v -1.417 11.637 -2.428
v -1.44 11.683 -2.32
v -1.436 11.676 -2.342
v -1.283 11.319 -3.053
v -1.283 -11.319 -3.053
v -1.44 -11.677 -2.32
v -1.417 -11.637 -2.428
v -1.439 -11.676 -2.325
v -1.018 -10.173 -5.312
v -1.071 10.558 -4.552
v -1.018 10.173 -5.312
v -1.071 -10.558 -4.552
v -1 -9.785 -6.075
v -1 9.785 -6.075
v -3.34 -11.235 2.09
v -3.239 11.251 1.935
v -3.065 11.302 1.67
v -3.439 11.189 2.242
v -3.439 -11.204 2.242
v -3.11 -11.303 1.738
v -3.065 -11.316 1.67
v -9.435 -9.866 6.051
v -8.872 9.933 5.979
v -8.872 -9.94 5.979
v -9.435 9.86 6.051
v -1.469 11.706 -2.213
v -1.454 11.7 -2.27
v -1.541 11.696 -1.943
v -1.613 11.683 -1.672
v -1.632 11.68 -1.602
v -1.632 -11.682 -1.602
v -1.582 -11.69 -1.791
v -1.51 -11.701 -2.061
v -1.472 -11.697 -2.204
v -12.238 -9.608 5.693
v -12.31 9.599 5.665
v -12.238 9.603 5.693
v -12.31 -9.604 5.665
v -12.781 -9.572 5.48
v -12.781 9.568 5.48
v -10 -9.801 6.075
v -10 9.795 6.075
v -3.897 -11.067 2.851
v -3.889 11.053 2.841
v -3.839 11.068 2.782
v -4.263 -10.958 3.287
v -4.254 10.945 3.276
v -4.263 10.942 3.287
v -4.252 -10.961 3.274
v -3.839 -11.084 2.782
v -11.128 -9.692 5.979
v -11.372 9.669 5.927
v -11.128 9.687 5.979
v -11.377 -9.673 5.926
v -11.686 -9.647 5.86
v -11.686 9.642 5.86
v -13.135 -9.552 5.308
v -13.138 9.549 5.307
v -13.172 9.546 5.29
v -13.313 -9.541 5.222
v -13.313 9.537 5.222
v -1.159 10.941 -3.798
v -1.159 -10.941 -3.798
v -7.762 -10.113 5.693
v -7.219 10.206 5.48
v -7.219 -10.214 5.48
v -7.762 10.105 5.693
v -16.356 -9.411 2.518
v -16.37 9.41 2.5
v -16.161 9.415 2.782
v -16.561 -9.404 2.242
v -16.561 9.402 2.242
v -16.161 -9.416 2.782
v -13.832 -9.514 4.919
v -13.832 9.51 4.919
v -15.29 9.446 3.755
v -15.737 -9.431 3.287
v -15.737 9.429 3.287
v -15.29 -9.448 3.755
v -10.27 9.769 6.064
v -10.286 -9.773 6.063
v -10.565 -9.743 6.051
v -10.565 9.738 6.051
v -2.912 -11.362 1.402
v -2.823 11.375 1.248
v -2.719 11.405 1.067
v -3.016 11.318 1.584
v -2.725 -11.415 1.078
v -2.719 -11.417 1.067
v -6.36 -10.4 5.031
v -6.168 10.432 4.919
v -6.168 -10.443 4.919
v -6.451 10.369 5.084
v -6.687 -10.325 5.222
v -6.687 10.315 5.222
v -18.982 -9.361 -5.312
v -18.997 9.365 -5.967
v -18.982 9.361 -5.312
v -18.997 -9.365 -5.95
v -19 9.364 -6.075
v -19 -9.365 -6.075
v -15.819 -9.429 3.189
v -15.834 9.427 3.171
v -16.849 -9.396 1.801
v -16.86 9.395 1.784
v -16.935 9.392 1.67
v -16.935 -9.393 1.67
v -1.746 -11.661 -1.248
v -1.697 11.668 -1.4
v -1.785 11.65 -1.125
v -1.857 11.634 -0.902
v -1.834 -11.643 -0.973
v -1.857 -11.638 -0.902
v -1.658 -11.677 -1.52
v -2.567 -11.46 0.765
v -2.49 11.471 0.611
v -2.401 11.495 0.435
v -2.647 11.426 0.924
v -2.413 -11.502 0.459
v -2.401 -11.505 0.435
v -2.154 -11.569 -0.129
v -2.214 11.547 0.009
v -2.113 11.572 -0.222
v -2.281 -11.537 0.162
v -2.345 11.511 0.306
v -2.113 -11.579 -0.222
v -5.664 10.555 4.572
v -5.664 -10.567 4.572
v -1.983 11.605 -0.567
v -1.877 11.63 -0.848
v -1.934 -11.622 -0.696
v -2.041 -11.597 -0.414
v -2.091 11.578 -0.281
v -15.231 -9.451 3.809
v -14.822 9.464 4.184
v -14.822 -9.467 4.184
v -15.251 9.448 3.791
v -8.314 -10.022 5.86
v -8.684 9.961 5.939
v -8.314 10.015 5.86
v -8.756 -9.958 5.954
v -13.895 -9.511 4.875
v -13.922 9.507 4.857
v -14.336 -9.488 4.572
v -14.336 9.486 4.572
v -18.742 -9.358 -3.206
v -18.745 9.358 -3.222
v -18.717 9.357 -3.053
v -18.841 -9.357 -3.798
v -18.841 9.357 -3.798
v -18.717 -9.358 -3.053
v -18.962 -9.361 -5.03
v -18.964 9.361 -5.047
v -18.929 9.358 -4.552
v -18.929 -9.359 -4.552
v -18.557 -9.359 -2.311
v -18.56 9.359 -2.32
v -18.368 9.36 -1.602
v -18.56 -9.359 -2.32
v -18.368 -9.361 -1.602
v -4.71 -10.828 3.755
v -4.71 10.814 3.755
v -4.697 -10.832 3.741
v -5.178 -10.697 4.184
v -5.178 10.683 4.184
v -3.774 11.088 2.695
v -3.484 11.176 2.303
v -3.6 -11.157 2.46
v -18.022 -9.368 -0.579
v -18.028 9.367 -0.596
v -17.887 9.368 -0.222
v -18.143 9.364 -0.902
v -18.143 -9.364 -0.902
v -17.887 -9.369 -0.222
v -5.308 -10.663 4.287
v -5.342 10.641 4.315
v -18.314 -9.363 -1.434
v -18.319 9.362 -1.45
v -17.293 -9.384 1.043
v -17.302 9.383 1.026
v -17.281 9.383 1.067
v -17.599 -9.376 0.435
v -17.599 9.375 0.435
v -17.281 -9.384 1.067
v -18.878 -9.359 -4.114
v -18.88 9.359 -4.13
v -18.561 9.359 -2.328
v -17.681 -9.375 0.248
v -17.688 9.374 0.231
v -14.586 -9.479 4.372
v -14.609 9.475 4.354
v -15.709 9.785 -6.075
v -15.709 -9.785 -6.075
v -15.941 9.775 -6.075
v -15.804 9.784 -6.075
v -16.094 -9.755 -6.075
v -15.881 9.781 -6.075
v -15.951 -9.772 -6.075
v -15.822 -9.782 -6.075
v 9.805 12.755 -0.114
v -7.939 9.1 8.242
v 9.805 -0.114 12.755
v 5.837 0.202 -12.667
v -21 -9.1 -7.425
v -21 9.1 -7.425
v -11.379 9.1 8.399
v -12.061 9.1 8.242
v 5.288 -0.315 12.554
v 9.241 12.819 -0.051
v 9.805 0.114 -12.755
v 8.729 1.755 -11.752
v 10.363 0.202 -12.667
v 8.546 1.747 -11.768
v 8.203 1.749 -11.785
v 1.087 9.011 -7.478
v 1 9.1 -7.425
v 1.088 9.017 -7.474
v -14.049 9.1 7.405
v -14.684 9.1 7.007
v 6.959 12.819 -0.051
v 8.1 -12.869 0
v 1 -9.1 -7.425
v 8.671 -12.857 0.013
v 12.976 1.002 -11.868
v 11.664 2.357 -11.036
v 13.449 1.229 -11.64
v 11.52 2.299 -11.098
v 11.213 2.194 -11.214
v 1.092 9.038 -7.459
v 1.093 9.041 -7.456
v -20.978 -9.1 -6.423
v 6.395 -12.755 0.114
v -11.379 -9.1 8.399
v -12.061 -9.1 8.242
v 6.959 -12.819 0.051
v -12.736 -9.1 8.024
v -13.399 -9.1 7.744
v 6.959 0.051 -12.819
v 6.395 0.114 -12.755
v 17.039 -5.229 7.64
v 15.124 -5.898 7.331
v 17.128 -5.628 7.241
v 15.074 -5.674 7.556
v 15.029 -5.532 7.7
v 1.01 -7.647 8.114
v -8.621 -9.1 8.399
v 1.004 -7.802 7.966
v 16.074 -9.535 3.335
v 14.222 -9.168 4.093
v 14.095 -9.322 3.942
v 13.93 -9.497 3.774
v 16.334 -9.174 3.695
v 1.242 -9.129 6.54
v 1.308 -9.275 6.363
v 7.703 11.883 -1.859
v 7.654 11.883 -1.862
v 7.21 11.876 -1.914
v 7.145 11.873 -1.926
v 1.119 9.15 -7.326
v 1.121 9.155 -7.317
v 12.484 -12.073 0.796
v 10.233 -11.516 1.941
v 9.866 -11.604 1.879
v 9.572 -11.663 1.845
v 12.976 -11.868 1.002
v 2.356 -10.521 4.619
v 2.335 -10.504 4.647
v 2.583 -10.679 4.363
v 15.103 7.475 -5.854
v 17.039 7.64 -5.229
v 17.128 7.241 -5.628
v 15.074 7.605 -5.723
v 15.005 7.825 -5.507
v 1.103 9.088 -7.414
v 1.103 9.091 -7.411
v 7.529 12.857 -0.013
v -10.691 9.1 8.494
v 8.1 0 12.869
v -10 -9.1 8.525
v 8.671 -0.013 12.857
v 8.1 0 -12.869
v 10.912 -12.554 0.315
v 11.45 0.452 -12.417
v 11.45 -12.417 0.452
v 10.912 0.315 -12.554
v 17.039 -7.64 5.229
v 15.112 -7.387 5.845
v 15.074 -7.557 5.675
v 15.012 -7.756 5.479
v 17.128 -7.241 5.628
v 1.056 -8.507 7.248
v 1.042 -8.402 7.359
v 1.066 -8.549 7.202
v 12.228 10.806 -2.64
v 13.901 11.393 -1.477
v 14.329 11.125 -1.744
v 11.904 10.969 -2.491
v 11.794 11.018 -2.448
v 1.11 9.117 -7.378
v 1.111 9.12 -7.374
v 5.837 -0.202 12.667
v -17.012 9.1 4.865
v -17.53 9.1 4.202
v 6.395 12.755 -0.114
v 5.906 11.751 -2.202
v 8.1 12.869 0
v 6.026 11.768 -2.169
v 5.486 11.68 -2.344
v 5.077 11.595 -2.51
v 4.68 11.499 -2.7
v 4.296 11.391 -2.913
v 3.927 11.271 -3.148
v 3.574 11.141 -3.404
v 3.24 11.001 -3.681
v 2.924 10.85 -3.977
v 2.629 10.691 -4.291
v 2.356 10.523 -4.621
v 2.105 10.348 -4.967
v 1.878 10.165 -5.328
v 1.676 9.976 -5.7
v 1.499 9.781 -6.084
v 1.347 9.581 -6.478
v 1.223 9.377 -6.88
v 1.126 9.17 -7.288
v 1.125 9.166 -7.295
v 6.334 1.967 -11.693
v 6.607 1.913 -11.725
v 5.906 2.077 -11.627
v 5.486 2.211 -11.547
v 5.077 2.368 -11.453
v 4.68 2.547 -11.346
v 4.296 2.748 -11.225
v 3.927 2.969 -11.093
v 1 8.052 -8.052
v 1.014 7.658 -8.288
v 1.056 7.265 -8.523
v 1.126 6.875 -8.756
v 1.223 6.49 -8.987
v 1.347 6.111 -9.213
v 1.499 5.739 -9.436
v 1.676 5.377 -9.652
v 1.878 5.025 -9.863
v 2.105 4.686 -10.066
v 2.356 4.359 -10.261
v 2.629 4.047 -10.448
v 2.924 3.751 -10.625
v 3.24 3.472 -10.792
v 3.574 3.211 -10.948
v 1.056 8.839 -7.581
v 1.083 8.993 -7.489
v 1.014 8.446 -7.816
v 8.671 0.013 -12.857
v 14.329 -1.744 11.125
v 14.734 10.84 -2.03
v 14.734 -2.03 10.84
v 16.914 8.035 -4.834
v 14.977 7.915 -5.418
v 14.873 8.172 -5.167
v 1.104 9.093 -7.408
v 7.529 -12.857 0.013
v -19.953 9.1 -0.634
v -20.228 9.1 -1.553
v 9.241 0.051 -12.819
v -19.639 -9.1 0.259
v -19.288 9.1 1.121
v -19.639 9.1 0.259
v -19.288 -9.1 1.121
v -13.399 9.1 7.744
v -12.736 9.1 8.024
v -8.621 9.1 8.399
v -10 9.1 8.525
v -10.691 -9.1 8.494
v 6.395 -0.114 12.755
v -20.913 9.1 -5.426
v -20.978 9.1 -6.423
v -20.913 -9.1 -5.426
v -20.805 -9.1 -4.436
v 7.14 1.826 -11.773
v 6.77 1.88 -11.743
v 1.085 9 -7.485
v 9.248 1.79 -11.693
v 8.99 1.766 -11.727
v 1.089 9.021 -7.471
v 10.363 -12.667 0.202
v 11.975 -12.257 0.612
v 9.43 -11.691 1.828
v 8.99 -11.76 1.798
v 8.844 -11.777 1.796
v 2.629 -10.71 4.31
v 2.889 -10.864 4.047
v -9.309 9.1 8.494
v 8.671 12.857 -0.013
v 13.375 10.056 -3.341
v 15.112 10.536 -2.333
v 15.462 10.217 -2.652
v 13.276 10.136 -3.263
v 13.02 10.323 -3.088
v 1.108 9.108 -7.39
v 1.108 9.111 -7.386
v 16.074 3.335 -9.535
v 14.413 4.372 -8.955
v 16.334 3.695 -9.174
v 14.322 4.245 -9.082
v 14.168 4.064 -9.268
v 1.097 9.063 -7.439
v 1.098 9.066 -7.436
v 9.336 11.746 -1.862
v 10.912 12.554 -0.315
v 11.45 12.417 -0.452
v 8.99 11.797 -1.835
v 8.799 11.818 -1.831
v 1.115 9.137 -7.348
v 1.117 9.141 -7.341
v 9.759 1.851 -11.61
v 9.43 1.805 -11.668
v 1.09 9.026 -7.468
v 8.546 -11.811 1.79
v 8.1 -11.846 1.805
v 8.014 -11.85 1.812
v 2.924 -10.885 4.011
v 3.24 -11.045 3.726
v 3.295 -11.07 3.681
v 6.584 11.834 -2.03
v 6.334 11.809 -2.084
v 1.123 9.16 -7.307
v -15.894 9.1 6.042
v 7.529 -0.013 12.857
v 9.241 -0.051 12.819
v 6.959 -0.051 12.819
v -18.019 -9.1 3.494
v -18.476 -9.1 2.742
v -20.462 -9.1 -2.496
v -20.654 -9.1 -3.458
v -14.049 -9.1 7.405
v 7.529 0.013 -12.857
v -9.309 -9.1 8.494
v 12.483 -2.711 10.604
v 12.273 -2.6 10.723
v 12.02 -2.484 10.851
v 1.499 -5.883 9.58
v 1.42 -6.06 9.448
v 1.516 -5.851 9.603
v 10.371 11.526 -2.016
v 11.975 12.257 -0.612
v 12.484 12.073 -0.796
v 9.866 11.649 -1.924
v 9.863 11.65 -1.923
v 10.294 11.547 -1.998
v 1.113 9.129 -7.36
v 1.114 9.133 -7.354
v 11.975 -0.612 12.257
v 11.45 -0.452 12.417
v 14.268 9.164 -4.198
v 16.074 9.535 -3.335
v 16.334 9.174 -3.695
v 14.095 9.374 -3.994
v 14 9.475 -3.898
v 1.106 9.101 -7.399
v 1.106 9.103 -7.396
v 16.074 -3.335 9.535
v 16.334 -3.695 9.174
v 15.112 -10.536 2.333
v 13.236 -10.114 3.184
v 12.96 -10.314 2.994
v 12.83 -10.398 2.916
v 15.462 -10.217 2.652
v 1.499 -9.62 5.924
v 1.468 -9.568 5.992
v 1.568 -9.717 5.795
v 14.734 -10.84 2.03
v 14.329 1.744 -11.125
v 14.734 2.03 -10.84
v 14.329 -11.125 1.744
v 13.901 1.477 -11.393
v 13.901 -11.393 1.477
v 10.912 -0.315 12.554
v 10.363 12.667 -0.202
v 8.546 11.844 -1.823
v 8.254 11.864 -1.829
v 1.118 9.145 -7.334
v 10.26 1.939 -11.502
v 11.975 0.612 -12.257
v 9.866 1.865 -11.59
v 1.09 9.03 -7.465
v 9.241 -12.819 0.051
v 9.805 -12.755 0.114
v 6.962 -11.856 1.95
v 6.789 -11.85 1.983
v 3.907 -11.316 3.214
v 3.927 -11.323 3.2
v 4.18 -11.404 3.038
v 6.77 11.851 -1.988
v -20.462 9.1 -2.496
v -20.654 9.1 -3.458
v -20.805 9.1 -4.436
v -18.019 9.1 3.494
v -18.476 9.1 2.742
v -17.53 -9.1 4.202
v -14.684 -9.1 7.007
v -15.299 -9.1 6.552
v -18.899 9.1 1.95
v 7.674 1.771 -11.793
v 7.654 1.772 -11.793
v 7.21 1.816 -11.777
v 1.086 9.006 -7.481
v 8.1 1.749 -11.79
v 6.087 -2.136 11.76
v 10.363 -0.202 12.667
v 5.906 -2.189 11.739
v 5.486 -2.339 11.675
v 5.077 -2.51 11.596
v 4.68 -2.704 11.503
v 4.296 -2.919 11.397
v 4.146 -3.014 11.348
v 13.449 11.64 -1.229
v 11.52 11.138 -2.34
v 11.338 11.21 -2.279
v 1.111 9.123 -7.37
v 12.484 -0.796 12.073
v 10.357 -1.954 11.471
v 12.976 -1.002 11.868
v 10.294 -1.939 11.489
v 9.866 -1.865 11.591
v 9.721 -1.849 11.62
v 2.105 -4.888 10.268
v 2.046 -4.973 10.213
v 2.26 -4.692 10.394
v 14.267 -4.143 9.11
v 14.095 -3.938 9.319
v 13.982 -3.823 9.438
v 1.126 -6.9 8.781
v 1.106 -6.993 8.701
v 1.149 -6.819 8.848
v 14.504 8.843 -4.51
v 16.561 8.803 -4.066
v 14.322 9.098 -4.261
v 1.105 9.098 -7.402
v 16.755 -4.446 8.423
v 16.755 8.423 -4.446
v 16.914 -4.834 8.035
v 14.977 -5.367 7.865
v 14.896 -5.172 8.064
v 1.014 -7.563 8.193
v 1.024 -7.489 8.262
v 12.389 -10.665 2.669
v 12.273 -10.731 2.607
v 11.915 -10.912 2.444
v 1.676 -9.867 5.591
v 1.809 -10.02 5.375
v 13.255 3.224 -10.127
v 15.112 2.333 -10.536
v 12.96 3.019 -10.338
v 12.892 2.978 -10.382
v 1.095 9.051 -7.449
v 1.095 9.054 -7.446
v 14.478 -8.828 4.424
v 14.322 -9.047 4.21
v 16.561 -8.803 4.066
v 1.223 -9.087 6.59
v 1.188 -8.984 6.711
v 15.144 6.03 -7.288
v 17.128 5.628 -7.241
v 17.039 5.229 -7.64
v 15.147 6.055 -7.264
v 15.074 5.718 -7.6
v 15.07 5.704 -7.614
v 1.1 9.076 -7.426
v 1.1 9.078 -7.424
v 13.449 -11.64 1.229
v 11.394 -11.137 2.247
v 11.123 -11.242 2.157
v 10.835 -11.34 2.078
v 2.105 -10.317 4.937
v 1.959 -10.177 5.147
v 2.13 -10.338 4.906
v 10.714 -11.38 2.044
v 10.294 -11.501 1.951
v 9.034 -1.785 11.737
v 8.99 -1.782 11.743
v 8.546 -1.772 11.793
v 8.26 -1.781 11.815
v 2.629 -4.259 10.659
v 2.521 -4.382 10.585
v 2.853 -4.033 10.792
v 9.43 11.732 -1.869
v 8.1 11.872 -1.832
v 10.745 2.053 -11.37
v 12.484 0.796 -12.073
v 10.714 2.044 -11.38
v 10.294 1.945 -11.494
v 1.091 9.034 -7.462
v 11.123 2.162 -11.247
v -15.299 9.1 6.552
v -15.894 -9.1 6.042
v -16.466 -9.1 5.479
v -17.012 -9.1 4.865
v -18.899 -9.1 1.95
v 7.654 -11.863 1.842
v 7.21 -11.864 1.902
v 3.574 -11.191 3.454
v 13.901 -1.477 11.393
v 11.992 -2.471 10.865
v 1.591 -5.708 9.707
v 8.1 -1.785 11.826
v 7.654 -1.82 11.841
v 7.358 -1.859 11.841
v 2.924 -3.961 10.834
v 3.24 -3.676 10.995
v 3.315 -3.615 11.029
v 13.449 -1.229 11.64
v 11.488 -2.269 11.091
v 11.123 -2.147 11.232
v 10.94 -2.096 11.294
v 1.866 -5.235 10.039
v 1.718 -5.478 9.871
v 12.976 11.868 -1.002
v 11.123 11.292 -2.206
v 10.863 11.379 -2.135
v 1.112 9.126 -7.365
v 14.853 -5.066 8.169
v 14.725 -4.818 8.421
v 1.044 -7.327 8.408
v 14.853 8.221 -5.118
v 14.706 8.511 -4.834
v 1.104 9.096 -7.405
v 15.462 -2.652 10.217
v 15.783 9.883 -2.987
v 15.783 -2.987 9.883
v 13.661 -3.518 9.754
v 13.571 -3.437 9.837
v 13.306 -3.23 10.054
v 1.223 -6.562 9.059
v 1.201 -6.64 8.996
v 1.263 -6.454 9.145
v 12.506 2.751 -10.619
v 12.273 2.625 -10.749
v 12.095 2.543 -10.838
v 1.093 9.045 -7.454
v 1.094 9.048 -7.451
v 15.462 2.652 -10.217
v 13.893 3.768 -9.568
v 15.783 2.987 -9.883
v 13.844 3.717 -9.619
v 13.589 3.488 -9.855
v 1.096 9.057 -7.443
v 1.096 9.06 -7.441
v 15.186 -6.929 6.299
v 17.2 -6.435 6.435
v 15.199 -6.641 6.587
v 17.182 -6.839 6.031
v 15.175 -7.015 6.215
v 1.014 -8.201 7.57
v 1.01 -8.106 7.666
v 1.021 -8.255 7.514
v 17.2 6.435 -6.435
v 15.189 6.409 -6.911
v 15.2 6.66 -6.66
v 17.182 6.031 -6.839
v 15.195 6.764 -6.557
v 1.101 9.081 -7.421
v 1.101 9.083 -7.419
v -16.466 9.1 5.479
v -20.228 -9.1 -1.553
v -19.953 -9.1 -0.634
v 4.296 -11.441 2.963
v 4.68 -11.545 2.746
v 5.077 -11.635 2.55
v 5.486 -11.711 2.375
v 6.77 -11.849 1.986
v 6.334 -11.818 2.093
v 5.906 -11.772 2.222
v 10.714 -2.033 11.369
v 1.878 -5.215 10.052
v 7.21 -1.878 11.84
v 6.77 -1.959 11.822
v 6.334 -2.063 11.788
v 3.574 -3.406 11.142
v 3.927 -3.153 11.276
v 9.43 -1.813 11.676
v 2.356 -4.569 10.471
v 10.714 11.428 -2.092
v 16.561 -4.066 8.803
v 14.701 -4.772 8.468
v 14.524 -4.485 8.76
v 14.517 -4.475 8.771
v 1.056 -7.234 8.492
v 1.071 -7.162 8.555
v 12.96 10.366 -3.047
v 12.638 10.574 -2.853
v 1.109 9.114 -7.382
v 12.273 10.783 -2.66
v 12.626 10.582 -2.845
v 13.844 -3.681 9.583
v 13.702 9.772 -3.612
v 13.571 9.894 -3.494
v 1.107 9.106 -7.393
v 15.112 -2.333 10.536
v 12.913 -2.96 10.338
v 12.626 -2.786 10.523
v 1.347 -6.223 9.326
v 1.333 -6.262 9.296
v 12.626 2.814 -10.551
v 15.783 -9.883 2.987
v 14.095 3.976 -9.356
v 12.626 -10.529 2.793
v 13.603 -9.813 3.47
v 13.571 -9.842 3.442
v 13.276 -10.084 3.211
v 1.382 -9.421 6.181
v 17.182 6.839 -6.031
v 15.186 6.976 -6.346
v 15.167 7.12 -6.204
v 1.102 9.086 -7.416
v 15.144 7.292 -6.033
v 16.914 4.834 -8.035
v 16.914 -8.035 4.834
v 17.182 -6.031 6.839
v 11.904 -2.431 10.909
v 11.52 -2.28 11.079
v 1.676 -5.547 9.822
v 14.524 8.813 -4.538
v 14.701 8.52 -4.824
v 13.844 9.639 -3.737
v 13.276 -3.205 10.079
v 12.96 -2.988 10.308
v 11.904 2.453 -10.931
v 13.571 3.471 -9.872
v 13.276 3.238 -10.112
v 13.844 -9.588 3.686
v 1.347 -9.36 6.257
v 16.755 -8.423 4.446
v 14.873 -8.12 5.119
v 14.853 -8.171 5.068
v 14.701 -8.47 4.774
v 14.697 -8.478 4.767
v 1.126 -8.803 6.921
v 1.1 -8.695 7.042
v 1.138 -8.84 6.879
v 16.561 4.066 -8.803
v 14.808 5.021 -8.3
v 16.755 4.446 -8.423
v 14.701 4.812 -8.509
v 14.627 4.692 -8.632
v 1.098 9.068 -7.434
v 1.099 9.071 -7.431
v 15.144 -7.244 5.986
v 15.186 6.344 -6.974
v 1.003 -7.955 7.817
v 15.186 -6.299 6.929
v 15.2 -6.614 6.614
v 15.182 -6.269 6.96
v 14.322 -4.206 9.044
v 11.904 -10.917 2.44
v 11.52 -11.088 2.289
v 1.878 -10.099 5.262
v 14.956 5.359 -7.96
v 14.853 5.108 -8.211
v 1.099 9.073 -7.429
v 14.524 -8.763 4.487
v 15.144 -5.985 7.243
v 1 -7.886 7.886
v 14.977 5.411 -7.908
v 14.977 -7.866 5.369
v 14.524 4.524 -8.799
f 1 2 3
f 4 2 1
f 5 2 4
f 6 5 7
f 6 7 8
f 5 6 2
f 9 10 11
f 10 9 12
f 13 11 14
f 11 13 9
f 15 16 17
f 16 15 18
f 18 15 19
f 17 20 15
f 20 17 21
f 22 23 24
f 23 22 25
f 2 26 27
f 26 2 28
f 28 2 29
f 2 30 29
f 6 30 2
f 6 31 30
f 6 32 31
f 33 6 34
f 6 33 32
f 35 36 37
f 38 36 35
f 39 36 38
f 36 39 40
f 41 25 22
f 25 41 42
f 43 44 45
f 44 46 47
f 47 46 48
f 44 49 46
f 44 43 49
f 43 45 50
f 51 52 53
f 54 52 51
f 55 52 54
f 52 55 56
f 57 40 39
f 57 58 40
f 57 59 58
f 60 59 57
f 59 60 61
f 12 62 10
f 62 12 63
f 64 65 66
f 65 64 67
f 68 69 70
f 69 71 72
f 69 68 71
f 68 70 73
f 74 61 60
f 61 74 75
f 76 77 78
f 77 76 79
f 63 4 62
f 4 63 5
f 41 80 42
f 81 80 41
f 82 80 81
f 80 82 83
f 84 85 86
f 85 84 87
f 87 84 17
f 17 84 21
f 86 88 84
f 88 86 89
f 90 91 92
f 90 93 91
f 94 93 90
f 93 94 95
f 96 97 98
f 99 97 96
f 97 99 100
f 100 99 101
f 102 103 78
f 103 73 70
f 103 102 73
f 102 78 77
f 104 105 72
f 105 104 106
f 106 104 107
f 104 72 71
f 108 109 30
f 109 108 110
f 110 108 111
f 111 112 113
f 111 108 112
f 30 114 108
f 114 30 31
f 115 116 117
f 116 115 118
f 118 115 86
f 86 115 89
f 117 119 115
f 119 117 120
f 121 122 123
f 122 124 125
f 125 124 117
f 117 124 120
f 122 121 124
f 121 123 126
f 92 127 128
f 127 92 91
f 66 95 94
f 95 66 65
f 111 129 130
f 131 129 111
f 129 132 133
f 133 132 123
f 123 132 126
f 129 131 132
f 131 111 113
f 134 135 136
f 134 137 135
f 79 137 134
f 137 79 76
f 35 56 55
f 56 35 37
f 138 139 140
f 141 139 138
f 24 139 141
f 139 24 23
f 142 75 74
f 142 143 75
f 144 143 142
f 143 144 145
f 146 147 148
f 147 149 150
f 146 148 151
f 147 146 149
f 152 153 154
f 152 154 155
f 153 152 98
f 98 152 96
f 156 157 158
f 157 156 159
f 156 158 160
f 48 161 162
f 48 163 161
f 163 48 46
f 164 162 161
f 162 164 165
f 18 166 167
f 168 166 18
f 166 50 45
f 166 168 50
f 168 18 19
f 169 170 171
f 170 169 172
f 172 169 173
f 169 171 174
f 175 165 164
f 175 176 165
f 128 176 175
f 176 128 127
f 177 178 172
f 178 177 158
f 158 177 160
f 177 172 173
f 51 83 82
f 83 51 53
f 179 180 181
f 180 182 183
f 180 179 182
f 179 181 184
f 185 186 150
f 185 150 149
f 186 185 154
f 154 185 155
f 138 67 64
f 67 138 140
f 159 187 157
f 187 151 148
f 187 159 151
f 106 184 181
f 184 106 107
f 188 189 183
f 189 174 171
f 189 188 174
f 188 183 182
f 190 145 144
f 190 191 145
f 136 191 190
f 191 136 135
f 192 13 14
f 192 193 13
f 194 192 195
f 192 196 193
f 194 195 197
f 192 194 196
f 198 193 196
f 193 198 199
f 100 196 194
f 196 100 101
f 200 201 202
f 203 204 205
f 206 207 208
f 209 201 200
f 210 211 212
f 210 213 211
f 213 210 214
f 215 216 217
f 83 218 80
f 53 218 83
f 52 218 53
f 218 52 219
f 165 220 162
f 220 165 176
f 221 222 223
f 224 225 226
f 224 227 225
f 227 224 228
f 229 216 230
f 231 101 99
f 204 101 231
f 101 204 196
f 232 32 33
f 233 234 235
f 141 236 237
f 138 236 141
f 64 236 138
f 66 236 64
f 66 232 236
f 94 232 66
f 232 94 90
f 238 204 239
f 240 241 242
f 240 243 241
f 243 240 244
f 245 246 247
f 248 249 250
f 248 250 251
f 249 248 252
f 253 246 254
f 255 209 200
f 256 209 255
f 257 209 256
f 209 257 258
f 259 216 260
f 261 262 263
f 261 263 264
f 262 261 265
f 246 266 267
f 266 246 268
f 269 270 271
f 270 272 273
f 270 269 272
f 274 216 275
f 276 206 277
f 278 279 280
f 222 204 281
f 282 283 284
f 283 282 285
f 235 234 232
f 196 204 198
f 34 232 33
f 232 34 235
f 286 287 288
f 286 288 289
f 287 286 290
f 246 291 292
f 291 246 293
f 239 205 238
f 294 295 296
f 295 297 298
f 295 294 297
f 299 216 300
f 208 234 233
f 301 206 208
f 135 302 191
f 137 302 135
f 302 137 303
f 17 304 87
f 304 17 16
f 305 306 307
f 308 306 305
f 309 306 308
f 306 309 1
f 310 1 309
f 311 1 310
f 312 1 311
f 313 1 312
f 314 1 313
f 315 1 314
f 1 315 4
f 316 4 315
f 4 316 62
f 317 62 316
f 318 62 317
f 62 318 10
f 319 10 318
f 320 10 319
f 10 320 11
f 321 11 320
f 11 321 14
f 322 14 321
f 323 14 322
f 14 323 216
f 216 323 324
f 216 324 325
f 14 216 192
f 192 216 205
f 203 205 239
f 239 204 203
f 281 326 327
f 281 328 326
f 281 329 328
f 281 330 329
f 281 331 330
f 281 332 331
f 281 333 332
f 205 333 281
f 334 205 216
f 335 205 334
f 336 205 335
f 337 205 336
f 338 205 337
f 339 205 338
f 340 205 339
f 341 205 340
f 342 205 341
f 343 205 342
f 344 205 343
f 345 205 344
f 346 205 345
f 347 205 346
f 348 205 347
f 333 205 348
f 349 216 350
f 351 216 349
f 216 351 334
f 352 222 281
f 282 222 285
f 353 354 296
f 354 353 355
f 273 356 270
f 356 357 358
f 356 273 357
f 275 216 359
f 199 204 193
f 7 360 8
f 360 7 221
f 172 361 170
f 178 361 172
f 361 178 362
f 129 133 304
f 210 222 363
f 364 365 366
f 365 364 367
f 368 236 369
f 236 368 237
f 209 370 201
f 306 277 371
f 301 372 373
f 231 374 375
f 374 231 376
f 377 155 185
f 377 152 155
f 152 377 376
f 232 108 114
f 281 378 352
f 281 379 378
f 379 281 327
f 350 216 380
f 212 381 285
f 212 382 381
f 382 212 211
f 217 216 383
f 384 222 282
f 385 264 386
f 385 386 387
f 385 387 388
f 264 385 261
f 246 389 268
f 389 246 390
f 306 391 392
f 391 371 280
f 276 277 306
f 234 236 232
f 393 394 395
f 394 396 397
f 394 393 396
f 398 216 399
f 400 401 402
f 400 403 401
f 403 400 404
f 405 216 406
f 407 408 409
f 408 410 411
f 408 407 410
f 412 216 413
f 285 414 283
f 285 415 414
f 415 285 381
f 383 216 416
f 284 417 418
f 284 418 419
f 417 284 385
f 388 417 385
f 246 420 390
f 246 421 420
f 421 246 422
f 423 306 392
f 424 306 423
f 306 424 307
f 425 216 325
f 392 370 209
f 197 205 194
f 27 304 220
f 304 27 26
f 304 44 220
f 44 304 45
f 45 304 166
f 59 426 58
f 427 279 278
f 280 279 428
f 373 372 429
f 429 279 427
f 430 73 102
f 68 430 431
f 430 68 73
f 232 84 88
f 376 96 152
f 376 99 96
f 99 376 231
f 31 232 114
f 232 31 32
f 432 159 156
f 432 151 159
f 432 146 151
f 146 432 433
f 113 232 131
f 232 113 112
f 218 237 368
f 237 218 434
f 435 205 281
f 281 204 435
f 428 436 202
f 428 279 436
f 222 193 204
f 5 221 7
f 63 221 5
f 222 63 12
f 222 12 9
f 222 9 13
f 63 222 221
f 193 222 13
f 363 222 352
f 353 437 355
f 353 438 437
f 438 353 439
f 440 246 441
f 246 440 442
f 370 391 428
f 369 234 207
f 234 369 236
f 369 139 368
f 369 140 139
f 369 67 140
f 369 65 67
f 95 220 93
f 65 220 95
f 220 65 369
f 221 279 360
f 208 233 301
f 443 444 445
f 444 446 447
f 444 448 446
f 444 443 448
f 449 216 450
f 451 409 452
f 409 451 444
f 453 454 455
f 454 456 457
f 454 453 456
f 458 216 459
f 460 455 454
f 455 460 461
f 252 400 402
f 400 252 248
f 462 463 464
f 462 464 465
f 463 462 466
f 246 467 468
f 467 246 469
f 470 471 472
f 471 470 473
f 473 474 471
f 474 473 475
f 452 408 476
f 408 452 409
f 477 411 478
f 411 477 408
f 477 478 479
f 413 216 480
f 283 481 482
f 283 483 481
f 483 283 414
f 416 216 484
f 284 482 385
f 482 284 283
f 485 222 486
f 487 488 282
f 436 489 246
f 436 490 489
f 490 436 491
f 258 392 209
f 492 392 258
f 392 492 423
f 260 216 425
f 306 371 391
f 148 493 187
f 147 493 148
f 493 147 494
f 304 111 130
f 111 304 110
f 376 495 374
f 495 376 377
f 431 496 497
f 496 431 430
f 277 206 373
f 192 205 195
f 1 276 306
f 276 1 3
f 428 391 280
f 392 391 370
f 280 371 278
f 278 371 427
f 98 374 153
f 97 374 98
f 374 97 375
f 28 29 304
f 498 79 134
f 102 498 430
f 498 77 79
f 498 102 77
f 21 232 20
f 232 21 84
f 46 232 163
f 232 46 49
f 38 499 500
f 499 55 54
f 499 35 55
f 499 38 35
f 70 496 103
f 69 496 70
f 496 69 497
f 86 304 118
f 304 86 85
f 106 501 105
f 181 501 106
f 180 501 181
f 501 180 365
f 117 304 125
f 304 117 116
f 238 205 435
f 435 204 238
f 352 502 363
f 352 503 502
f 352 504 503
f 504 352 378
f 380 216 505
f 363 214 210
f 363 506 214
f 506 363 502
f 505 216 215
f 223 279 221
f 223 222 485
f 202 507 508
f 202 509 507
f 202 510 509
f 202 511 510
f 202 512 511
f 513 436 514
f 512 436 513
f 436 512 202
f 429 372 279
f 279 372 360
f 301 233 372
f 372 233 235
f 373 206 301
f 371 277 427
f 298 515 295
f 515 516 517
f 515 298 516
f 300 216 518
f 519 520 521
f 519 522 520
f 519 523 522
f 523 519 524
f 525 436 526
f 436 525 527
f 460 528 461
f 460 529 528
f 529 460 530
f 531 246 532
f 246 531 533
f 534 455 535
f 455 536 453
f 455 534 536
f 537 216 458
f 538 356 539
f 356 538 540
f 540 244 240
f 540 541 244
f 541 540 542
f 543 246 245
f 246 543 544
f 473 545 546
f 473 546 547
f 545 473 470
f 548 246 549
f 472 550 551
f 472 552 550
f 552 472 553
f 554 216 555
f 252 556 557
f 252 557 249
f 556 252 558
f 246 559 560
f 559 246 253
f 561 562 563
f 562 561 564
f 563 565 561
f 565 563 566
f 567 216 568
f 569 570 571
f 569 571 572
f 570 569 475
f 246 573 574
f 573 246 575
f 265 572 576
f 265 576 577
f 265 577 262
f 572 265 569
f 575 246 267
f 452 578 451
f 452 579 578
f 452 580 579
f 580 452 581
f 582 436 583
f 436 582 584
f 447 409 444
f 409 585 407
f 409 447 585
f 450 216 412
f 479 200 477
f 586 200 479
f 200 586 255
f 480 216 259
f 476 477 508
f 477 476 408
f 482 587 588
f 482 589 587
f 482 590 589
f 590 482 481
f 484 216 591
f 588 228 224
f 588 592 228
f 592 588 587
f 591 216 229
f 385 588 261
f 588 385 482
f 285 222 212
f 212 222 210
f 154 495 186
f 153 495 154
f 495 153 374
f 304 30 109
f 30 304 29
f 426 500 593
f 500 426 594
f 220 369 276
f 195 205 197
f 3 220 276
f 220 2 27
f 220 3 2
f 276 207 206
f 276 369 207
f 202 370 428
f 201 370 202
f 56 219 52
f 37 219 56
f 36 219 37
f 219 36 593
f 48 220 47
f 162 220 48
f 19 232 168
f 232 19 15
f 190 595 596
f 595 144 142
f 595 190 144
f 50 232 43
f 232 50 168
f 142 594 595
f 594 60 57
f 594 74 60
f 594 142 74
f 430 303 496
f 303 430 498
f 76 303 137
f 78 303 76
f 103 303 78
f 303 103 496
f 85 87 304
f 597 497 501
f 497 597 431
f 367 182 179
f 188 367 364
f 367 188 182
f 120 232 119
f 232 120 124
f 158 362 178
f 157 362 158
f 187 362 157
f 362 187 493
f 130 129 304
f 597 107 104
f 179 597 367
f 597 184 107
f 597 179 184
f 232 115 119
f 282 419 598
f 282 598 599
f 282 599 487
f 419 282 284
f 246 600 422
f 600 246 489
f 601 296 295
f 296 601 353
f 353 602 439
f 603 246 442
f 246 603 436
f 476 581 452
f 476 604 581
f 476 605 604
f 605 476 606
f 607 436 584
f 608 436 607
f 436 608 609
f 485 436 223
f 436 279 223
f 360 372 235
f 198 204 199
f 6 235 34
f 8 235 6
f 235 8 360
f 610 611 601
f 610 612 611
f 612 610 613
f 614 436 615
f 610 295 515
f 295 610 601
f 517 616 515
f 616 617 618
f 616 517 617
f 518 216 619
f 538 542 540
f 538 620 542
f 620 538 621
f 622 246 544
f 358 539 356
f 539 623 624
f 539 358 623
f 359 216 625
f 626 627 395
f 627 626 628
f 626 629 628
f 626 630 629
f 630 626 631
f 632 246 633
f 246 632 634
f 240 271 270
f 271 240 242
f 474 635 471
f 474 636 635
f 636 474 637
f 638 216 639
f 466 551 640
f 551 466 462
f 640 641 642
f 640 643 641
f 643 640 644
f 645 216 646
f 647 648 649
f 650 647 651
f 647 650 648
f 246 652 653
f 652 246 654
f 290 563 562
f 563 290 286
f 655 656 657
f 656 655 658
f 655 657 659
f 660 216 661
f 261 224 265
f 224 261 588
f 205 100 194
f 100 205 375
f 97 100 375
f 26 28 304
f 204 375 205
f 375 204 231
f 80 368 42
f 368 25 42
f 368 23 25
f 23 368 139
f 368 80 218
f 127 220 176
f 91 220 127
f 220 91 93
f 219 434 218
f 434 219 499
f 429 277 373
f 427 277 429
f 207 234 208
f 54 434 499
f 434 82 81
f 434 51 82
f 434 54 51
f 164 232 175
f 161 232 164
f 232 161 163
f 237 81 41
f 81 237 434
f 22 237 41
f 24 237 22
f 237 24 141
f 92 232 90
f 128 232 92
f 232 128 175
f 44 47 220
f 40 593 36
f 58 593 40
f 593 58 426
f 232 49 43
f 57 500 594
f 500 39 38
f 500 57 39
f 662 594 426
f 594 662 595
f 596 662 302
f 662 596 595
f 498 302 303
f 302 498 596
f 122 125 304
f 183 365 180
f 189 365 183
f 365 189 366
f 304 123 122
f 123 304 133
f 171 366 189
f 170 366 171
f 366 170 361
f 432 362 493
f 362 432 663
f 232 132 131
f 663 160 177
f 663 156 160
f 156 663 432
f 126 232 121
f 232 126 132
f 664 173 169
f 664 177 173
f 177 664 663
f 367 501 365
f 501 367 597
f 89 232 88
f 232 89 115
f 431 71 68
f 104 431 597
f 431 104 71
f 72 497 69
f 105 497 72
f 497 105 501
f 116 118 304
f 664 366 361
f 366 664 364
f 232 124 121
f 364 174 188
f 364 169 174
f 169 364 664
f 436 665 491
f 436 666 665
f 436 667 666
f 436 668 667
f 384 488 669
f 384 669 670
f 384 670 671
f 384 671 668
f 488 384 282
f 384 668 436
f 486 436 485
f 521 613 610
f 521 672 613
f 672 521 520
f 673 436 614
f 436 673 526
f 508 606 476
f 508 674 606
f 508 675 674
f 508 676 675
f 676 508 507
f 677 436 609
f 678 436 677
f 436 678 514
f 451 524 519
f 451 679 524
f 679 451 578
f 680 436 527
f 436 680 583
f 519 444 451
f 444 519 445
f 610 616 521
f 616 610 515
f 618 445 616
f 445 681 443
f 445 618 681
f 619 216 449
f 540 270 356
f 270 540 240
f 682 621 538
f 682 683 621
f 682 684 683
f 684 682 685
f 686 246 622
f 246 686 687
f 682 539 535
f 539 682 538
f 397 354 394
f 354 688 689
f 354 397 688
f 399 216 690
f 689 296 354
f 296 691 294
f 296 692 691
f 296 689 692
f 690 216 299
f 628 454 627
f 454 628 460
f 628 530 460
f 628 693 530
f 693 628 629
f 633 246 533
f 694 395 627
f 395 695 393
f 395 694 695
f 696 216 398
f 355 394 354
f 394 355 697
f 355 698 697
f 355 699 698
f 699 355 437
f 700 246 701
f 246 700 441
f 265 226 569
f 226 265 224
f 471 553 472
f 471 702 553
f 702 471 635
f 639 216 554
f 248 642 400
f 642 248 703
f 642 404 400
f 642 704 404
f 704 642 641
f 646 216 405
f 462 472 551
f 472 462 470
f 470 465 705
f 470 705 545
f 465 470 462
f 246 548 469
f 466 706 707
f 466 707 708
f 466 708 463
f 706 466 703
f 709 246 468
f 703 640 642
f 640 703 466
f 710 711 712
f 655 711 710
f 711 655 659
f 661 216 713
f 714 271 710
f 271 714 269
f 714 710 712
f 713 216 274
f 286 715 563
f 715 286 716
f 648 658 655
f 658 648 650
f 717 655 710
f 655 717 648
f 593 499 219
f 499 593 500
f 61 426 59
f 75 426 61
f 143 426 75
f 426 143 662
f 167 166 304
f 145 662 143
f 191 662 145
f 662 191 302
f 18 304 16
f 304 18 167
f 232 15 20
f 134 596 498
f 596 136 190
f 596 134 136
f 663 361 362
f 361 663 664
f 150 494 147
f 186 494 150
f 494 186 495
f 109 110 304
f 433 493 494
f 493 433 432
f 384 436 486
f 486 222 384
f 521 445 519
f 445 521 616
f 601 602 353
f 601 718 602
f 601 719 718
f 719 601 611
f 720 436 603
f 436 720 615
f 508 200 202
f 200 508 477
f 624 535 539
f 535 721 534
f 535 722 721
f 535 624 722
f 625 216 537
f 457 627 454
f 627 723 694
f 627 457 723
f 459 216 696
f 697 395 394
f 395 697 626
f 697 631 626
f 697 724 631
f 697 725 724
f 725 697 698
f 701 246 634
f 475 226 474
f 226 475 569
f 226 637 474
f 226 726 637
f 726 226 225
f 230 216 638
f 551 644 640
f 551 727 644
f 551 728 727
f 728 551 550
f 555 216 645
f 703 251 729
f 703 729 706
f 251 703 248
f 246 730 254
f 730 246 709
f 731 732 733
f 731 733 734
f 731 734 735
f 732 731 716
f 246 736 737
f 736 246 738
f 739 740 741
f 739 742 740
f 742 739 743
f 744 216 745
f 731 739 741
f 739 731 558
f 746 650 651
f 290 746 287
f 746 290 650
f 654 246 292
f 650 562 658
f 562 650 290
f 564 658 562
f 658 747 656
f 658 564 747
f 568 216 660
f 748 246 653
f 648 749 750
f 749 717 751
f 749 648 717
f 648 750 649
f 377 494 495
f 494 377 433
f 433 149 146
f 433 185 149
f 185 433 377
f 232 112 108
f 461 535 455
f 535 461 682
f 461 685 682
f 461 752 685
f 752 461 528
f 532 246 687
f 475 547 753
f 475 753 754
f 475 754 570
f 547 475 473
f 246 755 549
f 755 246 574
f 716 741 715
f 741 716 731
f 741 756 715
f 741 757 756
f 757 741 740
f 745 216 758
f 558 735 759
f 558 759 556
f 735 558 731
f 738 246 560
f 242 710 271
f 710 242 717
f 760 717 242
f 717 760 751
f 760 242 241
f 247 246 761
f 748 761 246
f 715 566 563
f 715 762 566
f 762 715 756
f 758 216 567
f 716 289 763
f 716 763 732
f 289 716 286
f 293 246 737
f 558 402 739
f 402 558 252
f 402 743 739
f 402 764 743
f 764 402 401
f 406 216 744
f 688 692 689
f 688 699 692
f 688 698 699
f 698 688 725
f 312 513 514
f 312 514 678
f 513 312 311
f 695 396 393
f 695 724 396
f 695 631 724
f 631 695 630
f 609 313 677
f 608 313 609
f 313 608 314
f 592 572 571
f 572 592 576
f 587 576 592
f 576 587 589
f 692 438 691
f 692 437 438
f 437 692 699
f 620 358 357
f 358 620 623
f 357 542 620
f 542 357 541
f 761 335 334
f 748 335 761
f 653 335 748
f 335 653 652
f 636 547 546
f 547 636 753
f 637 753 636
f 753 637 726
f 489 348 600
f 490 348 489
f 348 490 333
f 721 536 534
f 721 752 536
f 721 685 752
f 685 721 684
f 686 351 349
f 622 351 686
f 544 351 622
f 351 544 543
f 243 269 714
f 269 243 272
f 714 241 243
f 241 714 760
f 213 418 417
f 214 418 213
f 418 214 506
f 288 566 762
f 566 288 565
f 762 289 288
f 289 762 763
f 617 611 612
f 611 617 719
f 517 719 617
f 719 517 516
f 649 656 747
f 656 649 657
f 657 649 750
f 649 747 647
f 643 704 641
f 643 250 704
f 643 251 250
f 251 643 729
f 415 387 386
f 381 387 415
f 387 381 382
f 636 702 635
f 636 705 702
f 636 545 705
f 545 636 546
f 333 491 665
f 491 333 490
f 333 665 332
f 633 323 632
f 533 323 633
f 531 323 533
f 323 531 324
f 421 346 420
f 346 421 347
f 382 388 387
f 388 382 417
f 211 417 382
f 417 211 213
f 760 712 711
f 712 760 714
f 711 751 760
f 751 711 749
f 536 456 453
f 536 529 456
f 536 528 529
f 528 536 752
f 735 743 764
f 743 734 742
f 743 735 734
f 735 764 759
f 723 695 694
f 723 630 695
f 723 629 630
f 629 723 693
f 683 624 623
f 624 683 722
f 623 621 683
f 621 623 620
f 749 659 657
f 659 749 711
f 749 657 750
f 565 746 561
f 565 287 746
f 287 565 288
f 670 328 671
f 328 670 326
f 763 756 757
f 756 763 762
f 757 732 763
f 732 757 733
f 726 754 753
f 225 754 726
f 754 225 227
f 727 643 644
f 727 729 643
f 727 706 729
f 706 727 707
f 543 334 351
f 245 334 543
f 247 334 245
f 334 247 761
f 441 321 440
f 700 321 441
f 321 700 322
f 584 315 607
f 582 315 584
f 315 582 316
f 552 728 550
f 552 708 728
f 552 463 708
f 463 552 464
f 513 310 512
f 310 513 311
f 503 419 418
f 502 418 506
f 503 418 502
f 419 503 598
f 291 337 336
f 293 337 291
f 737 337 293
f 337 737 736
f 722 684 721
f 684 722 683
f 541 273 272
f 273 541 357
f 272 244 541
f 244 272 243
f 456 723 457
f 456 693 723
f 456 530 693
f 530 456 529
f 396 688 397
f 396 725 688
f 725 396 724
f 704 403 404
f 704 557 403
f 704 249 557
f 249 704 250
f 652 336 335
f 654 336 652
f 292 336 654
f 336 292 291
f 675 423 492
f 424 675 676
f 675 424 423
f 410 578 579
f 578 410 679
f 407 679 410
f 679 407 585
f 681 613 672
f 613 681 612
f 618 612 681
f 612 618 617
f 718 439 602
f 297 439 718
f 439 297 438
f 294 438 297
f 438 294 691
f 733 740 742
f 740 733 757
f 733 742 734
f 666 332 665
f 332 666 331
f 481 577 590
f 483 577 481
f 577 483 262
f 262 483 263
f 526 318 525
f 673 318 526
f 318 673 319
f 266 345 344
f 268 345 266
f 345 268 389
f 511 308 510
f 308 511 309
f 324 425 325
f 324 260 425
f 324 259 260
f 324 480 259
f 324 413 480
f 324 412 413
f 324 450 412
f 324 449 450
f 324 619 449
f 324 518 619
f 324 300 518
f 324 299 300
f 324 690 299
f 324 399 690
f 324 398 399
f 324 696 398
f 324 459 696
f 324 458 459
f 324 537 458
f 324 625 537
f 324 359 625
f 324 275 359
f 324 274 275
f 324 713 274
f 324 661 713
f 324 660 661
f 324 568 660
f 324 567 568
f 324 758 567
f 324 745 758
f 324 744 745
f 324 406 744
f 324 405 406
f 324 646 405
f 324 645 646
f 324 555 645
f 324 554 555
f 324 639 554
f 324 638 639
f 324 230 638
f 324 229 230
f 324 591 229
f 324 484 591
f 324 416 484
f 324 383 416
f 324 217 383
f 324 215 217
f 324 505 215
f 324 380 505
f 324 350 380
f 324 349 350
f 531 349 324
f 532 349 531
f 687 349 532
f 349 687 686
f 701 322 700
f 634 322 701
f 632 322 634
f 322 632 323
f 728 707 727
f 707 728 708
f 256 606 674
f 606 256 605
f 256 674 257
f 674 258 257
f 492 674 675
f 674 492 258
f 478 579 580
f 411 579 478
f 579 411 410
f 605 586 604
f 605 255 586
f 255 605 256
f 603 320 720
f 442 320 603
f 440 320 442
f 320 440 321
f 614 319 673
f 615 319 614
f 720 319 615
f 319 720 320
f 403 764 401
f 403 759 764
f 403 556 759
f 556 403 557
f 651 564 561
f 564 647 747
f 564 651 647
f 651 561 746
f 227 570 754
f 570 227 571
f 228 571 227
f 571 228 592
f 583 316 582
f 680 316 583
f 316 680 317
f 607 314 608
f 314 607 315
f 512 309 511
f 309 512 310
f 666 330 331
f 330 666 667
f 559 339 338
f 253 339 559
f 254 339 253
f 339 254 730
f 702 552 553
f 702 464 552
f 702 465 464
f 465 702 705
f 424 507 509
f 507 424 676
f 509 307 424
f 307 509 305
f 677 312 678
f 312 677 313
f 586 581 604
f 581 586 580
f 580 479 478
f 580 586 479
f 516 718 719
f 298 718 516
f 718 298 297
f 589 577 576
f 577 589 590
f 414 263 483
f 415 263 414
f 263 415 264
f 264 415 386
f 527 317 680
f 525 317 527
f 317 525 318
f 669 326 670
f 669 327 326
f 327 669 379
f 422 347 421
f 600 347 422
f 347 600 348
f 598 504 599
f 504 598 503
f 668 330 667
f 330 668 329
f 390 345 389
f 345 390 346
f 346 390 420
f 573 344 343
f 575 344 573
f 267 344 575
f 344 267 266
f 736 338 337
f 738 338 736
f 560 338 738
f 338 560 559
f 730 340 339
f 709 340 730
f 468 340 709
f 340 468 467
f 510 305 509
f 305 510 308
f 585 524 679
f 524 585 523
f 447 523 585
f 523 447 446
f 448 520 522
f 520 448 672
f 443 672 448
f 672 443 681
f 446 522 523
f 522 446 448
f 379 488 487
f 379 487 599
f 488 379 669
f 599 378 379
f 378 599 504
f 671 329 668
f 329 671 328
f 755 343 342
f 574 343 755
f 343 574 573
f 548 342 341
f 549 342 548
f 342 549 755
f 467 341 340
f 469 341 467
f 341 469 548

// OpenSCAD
CLAMP_DIA = 18;
CLAMP_DEFORMATION = 1.35;
CLAMP_ANGLE = 0;

HOLE_DIA = 14.2;
HOLE_ANGLE = 45;

WALL_THICKNESS = 2;

WIDTH = HOLE_DIA + 2 * WALL_THICKNESS;
LENGTH = CLAMP_DIA + HOLE_DIA + 3 * WALL_THICKNESS;
HEIGHT = max(CLAMP_DIA/2 * CLAMP_DEFORMATION + 2 * WALL_THICKNESS, WIDTH);

$fn = 100;

module clamp() {
    w = CLAMP_DIA;
    rotate([0, -CLAMP_ANGLE, 0])
    translate([0, 0, -(w/2 * CLAMP_DEFORMATION)/2])
    intersection() {
        rotate([90, 0, 0])
        scale([1.0, CLAMP_DEFORMATION, 1.0])
        cylinder(d = w, h = WIDTH * 2, center = true);

        cylinder(d = WIDTH * 2, h = CLAMP_DIA);
    }
}

module hole() {
    rotate([HOLE_ANGLE, 0, 0])
    cylinder(d = HOLE_DIA, h = HEIGHT * 2, center = true);
}

module body() {
    difference() {
        hull() {
            w = CLAMP_DIA + 2 * WALL_THICKNESS;
            translate([-(CLAMP_DIA + WALL_THICKNESS)/2, 0, 0])
            rotate([0, -CLAMP_ANGLE, 0])
            translate([0, 0, -(w/2 * CLAMP_DEFORMATION)/2])
            intersection() {
                rotate([90, 0, 0])
                scale([1.0, CLAMP_DEFORMATION + 0.1, 1.0])
                cylinder(d = w, h = WIDTH, center = true);

                cylinder(d = WIDTH * 2, h = HEIGHT);
            }

            translate([(HOLE_DIA + WALL_THICKNESS)/2, 0, 0])
            rotate([HOLE_ANGLE, 0, 0])
            cylinder(d = HOLE_DIA + 2 * WALL_THICKNESS, h = HEIGHT, center = true);
        }

        #translate([-(CLAMP_DIA + WALL_THICKNESS)/2, 0, 0])
        clamp();
        #translate([(HOLE_DIA + WALL_THICKNESS)/2, 0, 0])
        hole();
    }
}

body();
